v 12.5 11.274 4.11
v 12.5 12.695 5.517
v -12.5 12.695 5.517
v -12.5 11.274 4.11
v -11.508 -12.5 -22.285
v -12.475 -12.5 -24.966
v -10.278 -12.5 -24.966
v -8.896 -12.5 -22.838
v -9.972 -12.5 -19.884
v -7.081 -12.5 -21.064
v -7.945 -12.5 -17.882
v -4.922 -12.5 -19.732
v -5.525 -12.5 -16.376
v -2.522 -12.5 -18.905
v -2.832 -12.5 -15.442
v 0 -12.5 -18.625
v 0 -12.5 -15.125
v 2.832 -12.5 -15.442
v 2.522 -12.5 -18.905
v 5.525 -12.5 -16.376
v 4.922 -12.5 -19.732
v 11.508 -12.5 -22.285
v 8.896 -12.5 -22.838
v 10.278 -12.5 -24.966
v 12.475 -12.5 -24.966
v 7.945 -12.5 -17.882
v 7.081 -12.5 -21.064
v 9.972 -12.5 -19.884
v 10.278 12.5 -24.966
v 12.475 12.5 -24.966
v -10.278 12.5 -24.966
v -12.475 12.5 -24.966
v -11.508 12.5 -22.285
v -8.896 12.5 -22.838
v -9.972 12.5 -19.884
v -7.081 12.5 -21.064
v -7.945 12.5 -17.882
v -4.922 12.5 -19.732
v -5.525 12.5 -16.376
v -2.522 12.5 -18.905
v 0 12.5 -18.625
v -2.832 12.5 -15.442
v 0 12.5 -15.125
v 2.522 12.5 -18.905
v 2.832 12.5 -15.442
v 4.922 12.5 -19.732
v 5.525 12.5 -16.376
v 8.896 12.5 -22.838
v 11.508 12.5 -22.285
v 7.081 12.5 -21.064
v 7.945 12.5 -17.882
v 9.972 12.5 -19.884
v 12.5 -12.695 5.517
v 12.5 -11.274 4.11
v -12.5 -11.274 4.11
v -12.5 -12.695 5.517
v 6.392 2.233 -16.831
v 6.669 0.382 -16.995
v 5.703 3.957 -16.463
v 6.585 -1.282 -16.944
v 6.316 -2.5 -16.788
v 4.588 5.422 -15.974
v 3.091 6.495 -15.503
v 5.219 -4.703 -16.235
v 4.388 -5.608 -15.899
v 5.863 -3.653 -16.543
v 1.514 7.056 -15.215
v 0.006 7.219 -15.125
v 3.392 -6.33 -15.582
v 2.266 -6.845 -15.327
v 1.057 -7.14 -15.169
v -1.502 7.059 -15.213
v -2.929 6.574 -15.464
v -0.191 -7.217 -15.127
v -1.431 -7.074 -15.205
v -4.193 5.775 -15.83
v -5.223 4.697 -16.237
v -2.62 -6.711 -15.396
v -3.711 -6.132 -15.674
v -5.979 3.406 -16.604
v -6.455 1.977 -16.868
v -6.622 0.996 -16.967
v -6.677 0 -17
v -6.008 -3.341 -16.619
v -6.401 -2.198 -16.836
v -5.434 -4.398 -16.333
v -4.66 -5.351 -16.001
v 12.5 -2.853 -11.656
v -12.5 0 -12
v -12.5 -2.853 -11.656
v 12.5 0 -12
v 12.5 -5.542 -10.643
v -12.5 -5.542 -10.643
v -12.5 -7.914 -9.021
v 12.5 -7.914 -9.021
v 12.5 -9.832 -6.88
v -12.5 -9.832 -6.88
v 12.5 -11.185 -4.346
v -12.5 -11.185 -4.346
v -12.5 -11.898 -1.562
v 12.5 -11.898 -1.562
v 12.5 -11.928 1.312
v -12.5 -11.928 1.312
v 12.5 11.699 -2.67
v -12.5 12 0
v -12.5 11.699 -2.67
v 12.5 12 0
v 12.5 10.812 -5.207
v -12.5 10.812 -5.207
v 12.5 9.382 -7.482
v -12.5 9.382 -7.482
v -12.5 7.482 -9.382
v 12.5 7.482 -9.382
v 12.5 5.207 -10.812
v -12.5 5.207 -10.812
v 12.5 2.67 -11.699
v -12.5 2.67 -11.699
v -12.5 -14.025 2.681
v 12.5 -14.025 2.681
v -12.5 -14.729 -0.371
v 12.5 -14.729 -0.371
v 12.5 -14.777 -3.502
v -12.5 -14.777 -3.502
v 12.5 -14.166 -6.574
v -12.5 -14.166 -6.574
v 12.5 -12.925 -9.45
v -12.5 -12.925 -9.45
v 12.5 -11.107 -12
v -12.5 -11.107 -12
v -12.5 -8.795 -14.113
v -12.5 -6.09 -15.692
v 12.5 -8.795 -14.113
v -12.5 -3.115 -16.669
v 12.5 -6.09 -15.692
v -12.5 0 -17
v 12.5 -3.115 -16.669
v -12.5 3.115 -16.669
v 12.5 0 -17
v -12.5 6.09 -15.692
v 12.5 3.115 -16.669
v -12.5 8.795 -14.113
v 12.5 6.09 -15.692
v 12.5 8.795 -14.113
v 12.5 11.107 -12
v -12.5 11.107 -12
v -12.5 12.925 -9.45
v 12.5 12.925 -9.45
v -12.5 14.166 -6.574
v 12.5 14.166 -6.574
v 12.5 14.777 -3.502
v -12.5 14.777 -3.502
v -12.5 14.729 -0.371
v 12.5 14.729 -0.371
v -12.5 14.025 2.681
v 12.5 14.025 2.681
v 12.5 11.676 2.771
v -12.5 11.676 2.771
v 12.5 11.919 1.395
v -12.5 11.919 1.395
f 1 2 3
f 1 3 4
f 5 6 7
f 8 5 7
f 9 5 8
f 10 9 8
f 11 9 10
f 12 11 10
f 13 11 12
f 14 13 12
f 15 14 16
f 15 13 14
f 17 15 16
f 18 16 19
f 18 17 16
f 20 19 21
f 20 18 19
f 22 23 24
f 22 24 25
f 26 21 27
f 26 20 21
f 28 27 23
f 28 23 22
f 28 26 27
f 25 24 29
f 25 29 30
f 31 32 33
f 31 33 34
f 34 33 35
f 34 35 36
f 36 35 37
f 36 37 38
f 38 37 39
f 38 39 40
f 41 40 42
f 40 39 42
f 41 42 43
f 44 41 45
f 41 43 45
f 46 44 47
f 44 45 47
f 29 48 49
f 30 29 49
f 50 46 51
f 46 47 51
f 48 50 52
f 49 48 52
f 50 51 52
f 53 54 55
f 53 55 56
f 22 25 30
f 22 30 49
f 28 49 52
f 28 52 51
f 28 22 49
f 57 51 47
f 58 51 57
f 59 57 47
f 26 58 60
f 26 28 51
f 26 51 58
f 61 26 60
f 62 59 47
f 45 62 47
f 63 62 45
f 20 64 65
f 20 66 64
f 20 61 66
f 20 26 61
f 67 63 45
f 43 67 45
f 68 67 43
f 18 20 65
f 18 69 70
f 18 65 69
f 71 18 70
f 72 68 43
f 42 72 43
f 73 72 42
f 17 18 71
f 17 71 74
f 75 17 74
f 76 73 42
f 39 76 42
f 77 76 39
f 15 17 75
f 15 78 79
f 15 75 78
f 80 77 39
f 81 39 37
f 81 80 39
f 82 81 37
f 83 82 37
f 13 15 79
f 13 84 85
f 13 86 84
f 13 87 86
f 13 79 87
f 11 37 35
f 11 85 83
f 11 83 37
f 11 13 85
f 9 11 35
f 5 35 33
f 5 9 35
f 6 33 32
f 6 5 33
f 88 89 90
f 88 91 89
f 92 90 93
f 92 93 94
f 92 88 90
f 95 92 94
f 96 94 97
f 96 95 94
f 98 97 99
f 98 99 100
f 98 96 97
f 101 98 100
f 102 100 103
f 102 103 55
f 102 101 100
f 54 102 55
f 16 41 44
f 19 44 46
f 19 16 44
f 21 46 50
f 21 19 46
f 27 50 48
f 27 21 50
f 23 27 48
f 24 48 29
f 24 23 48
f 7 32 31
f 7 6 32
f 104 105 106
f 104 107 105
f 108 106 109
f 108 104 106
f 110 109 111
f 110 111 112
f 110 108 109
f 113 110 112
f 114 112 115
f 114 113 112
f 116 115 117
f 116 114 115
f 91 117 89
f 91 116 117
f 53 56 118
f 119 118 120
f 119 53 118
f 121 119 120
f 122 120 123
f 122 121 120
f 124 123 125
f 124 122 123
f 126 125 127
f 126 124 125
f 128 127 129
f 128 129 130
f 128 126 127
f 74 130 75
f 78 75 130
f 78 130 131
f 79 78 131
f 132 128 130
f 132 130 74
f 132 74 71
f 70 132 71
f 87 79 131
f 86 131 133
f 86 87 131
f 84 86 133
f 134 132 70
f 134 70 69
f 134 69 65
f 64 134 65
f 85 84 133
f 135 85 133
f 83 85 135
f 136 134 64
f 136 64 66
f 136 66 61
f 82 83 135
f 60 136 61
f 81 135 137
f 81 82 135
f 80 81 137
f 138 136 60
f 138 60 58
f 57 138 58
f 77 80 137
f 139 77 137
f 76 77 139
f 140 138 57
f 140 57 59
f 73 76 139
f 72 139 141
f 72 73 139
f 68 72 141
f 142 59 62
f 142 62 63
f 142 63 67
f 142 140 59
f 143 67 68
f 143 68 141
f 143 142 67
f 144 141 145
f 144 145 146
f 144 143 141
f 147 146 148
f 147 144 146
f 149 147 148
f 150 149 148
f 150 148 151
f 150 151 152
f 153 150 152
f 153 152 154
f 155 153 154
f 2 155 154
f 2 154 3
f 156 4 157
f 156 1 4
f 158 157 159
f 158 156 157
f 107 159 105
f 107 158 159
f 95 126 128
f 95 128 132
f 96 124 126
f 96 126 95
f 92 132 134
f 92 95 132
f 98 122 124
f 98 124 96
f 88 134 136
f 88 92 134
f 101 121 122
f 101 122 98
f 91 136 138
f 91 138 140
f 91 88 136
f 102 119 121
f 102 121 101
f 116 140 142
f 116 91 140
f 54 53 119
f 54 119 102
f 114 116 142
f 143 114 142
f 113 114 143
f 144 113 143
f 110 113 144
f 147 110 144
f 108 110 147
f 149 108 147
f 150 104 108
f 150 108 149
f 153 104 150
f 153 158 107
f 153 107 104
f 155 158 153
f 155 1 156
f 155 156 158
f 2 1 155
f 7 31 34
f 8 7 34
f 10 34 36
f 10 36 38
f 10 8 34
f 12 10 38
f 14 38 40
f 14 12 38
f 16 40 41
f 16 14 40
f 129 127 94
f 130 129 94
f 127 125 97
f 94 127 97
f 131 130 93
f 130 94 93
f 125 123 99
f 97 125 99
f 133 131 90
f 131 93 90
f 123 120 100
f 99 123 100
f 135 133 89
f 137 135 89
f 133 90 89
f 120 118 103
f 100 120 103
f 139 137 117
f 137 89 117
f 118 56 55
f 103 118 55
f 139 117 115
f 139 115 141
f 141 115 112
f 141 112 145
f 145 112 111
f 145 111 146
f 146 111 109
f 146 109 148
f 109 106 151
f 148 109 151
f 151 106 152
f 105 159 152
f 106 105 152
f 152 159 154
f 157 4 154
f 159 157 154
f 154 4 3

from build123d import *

# Parameters (mm, degrees)
F1_DEPTH = 12.5
F3_DEPTH = 12.5


with BuildPart() as f1:
    # F0 (on Right) → F1 (new body, symmetric)
    with BuildSketch(Plane.YZ):
        with BuildLine():
            Line((0, -17), (0, -12))
            ThreePointArc((0, -12), (-9.8315408875, -6.8804653751), (-11.2742627767, 4.1098660371))
            Line((-11.2742627767, 4.1098660371), (-12.6953165638, 5.5172061289))
            ThreePointArc((-12.6953165638, 5.5172061289), (-12.9247401764, -9.4495895167), (0, -17))
        make_face()
        with BuildLine():
            ThreePointArc((11.2742627767, 4.1098660371), (11.8171729555, 2.0867255066), (12, 0))
            ThreePointArc((12, 0), (8.4852813742, -8.4852813742), (0, -12))
            Line((0, -12), (0, -17))
            ThreePointArc((0, -17), (12.9247401764, -9.4495895167), (12.6953165638, 5.5172061289))
            Line((12.6953165638, 5.5172061289), (11.2742627767, 4.1098660371))
        make_face()
    extrude(amount=F1_DEPTH, both=True)

    # F2 (on Front) → F3 (join, symmetric)
    with BuildSketch(Plane.XZ):
        with BuildLine():
            ThreePointArc((0, -18.6252225989), (6.0382661769, -20.3380196492), (10.2778672238, -24.9662066724))
            Line((10.2778672238, -24.9662066724), (12.4753578975, -24.9662066724))
            ThreePointArc((12.4753578975, -24.9662066724), (7.944802109, -17.8816045994), (0, -15.1252225989))
            Line((0, -15.1252225989), (0, -18.6252225989))
        make_face()
        with BuildLine():
            Line((-12.4753578975, -24.9662066724), (-10.2778672238, -24.9662066724))
            ThreePointArc((-10.2778672238, -24.9662066724), (-6.0382661769, -20.3380196492), (0, -18.6252225989))
            Line((0, -18.6252225989), (0, -15.1252225989))
            ThreePointArc((0, -15.1252225989), (-7.944802109, -17.8816045994), (-12.4753578975, -24.9662066724))
        make_face()
    extrude(amount=F3_DEPTH, both=True)


solid = f1.part
